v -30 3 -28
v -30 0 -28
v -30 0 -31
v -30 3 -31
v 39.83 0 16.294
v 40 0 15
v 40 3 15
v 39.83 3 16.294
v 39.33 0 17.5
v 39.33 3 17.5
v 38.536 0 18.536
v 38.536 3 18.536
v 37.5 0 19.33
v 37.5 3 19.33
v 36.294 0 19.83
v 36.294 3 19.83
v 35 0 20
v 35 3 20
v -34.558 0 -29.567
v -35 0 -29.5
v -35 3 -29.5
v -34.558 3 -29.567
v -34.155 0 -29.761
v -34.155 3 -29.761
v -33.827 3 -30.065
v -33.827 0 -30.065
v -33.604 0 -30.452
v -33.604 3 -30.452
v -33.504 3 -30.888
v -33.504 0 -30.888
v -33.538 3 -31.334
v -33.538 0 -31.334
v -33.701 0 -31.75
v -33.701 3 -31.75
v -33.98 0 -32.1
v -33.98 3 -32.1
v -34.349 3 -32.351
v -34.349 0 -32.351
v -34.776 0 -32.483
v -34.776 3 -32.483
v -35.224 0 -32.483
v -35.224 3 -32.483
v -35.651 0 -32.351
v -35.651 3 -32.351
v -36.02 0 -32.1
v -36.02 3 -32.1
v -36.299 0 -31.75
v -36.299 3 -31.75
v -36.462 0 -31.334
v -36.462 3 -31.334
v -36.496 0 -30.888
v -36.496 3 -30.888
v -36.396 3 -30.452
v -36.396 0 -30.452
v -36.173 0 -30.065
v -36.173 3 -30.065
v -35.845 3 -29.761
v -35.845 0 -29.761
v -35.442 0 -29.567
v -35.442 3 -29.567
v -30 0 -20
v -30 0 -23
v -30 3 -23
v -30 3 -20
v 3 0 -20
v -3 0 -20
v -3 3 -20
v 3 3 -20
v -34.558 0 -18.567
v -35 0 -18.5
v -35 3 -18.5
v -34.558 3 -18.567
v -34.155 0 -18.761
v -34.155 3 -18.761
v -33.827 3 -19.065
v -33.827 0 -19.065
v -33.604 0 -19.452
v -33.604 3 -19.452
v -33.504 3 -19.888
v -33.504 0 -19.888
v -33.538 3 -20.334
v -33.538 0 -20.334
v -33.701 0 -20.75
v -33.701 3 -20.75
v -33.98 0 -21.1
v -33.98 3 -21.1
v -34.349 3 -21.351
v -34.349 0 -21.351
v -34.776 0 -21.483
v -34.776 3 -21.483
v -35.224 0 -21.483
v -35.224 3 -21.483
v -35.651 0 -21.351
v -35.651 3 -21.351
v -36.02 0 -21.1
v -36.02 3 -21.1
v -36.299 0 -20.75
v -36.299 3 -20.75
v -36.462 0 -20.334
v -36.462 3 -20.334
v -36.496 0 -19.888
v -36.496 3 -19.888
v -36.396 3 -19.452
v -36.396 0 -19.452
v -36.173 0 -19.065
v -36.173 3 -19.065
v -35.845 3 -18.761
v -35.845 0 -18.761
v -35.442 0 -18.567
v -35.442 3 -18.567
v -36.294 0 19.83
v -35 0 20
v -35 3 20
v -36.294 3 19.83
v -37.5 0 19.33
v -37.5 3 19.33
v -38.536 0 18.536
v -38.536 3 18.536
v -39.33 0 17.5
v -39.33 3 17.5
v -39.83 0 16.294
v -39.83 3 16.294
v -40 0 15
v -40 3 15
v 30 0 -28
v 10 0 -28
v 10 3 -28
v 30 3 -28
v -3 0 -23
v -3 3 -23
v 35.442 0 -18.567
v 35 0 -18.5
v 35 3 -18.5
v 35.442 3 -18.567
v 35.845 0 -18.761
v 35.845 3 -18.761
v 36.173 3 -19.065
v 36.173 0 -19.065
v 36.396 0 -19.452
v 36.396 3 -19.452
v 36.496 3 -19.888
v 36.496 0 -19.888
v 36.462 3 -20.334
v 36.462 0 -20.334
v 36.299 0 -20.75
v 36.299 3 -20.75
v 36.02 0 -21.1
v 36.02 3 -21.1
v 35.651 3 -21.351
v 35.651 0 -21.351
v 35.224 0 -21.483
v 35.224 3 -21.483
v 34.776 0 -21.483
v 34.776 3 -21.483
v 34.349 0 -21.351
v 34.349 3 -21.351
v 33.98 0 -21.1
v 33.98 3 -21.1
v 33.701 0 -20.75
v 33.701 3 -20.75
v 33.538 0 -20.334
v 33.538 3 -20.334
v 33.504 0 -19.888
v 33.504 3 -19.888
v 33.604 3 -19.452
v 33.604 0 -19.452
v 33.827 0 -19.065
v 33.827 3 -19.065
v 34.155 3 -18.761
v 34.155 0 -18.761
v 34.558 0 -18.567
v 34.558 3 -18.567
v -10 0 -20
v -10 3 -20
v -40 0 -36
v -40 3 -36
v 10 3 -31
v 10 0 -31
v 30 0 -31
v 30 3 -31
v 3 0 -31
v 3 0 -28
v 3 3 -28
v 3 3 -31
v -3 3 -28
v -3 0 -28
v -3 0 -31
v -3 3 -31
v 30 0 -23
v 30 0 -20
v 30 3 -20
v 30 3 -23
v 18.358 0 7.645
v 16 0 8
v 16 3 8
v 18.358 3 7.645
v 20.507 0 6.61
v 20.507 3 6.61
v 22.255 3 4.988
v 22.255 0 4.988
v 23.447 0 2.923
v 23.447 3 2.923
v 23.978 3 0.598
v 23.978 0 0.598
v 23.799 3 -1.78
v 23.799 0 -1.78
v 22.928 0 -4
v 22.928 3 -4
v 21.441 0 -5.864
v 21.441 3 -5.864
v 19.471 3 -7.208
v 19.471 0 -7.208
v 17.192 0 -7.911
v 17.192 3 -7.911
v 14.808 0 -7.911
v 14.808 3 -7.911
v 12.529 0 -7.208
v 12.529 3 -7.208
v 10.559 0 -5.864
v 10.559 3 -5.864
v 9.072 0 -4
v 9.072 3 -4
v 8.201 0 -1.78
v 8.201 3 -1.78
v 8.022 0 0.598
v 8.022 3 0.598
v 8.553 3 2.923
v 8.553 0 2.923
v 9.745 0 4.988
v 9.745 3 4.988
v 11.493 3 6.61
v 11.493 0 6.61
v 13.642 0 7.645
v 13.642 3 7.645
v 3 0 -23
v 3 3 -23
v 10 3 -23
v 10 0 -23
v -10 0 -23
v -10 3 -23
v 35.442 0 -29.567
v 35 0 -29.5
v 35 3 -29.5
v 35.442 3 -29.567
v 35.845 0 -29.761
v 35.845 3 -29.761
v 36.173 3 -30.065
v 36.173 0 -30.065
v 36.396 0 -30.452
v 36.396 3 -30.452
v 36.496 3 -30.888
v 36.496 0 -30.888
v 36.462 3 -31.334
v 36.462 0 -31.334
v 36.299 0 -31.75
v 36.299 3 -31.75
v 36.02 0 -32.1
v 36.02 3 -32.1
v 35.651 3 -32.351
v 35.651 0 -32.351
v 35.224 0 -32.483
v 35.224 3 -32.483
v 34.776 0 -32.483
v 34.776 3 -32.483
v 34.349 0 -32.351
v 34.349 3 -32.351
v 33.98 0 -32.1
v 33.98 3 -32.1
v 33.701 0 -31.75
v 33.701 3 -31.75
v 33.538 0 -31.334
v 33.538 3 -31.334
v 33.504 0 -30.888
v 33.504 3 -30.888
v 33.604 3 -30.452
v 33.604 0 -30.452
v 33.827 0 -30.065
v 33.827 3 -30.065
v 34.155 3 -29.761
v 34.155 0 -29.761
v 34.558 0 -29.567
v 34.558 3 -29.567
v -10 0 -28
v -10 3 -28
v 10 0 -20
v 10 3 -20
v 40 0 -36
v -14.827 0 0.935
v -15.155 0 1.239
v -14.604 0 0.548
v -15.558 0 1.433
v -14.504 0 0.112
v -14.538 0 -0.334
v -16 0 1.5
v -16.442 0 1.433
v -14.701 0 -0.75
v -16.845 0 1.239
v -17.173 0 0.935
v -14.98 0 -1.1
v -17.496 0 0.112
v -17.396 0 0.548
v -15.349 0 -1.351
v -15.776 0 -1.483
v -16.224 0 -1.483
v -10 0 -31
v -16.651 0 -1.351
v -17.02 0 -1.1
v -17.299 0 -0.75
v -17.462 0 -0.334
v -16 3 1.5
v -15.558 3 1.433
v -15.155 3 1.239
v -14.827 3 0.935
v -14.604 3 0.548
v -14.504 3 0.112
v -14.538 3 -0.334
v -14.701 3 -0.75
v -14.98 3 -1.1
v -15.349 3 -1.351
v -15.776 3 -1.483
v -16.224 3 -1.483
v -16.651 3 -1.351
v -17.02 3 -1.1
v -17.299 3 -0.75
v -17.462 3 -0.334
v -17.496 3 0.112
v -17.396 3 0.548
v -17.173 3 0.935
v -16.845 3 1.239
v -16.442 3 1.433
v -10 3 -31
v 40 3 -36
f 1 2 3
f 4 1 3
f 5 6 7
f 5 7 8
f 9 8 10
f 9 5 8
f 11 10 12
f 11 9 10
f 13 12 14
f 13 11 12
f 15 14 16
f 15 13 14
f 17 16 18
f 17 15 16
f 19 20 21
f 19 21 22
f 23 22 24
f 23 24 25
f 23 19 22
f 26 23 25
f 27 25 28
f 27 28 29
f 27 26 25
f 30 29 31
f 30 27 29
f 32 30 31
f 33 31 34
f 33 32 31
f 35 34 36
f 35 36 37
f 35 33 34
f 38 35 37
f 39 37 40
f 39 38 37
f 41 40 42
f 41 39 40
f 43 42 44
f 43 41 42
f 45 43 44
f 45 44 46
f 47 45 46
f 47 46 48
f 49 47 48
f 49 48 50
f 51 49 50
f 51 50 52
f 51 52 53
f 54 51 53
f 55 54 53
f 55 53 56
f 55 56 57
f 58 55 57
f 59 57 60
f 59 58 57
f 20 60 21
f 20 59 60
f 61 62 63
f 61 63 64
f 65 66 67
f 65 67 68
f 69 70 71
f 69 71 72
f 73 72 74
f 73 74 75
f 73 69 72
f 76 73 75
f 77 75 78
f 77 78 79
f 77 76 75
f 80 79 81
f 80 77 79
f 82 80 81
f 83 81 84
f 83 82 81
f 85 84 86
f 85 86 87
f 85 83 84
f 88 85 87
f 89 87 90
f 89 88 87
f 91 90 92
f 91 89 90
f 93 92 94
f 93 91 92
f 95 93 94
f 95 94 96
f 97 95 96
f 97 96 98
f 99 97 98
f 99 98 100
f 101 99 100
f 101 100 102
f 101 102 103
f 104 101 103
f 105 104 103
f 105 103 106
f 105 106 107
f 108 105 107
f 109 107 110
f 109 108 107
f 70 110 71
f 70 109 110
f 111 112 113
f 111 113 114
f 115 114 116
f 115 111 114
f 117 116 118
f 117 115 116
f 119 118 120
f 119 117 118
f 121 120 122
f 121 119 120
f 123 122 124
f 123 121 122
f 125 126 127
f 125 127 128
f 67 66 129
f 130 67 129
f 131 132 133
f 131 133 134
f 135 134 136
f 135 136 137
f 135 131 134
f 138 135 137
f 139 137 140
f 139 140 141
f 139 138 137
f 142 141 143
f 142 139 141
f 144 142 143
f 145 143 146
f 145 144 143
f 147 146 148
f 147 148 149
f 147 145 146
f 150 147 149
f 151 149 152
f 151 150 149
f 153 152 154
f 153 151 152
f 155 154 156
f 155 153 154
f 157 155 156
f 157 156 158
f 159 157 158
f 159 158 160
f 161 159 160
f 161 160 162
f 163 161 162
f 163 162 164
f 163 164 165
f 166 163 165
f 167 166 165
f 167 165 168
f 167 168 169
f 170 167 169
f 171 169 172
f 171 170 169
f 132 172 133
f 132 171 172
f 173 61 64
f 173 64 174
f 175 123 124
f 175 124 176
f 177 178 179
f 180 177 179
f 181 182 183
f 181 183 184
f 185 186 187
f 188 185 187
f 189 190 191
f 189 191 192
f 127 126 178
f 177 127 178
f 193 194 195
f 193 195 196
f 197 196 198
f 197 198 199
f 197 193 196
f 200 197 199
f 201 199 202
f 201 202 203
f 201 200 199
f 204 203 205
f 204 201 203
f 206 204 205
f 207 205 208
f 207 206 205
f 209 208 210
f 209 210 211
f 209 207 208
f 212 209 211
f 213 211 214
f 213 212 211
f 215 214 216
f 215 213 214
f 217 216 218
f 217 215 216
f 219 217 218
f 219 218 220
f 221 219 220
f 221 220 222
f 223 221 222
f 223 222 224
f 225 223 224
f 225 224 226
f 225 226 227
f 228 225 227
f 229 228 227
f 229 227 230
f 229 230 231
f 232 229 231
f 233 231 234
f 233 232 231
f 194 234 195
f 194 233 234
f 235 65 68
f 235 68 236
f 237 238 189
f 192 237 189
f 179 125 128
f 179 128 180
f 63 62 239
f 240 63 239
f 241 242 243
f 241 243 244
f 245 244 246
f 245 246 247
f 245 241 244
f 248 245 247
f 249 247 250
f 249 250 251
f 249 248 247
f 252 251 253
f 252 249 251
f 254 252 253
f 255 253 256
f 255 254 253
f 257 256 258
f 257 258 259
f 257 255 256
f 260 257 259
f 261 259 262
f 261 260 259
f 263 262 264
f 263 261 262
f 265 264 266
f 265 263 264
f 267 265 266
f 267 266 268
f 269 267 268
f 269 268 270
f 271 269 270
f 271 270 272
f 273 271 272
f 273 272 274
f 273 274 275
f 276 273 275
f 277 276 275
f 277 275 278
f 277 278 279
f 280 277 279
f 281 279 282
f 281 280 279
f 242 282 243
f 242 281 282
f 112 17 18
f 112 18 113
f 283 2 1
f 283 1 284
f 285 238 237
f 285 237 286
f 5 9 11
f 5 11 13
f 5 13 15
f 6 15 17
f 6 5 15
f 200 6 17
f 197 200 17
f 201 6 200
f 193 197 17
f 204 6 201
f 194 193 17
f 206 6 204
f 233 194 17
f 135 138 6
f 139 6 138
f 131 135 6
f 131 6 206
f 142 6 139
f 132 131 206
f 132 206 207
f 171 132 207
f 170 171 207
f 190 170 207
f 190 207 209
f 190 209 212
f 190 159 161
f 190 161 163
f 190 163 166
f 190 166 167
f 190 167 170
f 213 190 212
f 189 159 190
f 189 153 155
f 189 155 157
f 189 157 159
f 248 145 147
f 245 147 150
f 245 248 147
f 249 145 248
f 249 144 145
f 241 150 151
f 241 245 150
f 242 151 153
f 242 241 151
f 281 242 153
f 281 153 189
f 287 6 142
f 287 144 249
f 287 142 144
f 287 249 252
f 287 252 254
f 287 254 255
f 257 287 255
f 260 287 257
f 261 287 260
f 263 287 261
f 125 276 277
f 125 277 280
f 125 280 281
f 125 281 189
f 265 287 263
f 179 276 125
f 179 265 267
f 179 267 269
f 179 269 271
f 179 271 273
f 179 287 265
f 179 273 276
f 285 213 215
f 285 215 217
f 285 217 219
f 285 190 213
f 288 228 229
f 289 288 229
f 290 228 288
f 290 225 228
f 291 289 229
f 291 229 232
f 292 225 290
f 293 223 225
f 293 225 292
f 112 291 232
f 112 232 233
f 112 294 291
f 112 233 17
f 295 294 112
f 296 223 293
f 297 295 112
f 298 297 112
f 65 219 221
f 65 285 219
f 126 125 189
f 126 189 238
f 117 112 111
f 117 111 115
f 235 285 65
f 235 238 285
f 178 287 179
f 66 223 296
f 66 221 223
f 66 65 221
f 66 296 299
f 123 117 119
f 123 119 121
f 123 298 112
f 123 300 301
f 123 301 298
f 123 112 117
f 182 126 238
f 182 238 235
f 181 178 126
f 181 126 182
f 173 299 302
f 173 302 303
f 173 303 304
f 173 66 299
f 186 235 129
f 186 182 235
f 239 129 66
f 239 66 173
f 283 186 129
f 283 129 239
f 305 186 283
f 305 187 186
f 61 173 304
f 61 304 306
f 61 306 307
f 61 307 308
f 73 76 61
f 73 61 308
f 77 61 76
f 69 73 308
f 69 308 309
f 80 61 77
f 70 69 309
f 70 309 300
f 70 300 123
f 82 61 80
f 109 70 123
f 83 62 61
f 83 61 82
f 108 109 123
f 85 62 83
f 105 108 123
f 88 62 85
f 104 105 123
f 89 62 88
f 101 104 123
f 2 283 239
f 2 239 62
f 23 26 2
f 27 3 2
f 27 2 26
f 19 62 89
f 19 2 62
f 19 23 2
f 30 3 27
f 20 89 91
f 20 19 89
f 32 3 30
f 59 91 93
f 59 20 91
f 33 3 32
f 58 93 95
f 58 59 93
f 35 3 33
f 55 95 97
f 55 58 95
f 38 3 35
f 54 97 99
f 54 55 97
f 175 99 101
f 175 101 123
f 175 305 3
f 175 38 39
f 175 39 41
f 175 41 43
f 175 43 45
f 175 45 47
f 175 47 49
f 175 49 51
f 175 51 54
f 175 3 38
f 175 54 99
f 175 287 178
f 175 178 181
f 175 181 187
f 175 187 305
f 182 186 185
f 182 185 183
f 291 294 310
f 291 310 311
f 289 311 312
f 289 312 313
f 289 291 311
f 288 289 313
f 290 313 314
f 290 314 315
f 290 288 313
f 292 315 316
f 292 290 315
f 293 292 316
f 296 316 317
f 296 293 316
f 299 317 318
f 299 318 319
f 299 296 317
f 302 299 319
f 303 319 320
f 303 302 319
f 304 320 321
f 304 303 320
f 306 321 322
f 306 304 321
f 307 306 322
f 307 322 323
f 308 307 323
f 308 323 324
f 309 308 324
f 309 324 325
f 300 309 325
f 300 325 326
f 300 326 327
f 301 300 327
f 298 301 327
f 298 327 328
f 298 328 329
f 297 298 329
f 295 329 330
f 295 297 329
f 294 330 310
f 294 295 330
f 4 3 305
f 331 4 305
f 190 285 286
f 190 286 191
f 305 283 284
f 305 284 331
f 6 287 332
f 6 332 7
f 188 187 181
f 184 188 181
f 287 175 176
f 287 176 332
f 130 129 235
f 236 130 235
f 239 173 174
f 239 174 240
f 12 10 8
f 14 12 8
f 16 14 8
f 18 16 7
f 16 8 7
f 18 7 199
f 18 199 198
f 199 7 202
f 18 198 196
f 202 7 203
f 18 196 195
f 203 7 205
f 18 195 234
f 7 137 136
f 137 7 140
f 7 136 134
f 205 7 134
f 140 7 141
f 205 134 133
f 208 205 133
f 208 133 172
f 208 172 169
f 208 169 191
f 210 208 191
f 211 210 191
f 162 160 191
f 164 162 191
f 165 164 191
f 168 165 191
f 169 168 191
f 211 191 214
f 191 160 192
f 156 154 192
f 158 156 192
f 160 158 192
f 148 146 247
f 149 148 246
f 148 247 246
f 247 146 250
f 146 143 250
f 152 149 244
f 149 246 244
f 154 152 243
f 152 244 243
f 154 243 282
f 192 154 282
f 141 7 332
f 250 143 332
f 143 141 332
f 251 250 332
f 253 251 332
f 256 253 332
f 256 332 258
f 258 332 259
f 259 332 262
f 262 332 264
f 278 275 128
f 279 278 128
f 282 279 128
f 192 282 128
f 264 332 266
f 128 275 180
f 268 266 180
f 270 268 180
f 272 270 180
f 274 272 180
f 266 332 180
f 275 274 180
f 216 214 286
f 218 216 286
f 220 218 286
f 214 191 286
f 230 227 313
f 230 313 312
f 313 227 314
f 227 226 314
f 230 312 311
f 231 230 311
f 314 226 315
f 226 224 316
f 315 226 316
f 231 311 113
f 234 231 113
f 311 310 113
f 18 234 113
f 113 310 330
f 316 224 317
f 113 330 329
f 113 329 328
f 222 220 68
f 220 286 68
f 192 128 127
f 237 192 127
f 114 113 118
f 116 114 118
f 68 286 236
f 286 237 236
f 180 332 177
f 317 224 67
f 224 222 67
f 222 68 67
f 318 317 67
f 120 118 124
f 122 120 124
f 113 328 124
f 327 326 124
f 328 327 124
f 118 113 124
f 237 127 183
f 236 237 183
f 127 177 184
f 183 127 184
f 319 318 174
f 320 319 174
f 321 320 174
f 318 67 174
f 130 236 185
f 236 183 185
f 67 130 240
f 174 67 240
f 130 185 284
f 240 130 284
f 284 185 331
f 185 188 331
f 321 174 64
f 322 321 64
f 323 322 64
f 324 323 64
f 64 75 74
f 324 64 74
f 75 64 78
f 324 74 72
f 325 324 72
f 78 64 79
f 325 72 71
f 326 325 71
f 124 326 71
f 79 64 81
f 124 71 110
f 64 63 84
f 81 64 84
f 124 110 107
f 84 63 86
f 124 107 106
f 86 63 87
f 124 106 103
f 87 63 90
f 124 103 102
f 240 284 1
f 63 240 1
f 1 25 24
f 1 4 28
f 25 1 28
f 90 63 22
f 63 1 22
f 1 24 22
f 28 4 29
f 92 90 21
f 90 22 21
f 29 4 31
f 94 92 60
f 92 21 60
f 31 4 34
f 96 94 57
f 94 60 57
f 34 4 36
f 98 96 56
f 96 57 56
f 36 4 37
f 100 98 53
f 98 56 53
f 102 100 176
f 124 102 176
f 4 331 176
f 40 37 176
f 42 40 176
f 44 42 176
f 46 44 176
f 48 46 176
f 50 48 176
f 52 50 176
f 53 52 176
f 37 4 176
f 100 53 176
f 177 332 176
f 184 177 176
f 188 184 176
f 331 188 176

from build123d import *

# Parameters (mm, degrees)
SKETCH_1_R      = 8
SKETCH_1_R_2    = 1.5
SKETCH_1_W      = 20
SKETCH_1_H      = 3
SKETCH_1_W_2    = 6
EXTRUDE_1_DEPTH = 3


with BuildPart() as part:
    # 草图1 → 凸台-拉伸1 (new body)
    with BuildSketch(Plane(origin=(0, 0, 0), x_dir=(1, 0, 0), z_dir=(0, 1, 0))):
        with BuildLine():
            Line((-40, 0), (-40, 20))
            Line((-40, 20), (-40, 36))
            Line((-40, 36), (40, 36))
            Line((40, 36), (40, 20))
            Line((40, 20), (40, -15))
            ThreePointArc((40, -15), (38.535533906, -18.535533906), (35, -20))
            Line((35, -20), (0, -20))
            Line((0, -20), (-35, -20))
            ThreePointArc((-35, -20), (-38.535533906, -18.535533906), (-40, -15))
            Line((-40, -15), (-40, 0))
        make_face()
        with Locations(Location((16, 0, 0), (0, 0, 270))):
            Circle(SKETCH_1_R, mode=Mode.SUBTRACT)
        with Locations(Location((-16, 0, 0), (0, 0, 270))):
            Circle(SKETCH_1_R_2, mode=Mode.SUBTRACT)
        with Locations(Location((-35, 31, 0), (0, 0, 270))):
            Circle(SKETCH_1_R_2, mode=Mode.SUBTRACT)
        with Locations(Location((-35, 20, 0), (0, 0, 270))):
            Circle(SKETCH_1_R_2, mode=Mode.SUBTRACT)
        with Locations(Location((35, 20, 0), (0, 0, 270))):
            Circle(SKETCH_1_R_2, mode=Mode.SUBTRACT)
        with Locations(Location((35, 31, 0), (0, 0, 270))):
            Circle(SKETCH_1_R_2, mode=Mode.SUBTRACT)
        Polygon((-30, 20), (-10, 20), (-10, 23), (-20, 23), (-30, 23), align=None, mode=Mode.SUBTRACT)
        Polygon((10, 23), (10, 20), (30, 20), (30, 23), (20, 23), align=None, mode=Mode.SUBTRACT)
        with Locations((20, 29.5)):
            Rectangle(SKETCH_1_W, SKETCH_1_H, mode=Mode.SUBTRACT)
        with Locations((0, 29.5)):
            Rectangle(SKETCH_1_W_2, SKETCH_1_H, mode=Mode.SUBTRACT)
        with Locations((-20, 29.5)):
            Rectangle(SKETCH_1_W, SKETCH_1_H, mode=Mode.SUBTRACT)
        with Locations((0, 21.5)):
            Rectangle(SKETCH_1_W_2, SKETCH_1_H, mode=Mode.SUBTRACT)
    extrude(amount=EXTRUDE_1_DEPTH)


solid = part.part
